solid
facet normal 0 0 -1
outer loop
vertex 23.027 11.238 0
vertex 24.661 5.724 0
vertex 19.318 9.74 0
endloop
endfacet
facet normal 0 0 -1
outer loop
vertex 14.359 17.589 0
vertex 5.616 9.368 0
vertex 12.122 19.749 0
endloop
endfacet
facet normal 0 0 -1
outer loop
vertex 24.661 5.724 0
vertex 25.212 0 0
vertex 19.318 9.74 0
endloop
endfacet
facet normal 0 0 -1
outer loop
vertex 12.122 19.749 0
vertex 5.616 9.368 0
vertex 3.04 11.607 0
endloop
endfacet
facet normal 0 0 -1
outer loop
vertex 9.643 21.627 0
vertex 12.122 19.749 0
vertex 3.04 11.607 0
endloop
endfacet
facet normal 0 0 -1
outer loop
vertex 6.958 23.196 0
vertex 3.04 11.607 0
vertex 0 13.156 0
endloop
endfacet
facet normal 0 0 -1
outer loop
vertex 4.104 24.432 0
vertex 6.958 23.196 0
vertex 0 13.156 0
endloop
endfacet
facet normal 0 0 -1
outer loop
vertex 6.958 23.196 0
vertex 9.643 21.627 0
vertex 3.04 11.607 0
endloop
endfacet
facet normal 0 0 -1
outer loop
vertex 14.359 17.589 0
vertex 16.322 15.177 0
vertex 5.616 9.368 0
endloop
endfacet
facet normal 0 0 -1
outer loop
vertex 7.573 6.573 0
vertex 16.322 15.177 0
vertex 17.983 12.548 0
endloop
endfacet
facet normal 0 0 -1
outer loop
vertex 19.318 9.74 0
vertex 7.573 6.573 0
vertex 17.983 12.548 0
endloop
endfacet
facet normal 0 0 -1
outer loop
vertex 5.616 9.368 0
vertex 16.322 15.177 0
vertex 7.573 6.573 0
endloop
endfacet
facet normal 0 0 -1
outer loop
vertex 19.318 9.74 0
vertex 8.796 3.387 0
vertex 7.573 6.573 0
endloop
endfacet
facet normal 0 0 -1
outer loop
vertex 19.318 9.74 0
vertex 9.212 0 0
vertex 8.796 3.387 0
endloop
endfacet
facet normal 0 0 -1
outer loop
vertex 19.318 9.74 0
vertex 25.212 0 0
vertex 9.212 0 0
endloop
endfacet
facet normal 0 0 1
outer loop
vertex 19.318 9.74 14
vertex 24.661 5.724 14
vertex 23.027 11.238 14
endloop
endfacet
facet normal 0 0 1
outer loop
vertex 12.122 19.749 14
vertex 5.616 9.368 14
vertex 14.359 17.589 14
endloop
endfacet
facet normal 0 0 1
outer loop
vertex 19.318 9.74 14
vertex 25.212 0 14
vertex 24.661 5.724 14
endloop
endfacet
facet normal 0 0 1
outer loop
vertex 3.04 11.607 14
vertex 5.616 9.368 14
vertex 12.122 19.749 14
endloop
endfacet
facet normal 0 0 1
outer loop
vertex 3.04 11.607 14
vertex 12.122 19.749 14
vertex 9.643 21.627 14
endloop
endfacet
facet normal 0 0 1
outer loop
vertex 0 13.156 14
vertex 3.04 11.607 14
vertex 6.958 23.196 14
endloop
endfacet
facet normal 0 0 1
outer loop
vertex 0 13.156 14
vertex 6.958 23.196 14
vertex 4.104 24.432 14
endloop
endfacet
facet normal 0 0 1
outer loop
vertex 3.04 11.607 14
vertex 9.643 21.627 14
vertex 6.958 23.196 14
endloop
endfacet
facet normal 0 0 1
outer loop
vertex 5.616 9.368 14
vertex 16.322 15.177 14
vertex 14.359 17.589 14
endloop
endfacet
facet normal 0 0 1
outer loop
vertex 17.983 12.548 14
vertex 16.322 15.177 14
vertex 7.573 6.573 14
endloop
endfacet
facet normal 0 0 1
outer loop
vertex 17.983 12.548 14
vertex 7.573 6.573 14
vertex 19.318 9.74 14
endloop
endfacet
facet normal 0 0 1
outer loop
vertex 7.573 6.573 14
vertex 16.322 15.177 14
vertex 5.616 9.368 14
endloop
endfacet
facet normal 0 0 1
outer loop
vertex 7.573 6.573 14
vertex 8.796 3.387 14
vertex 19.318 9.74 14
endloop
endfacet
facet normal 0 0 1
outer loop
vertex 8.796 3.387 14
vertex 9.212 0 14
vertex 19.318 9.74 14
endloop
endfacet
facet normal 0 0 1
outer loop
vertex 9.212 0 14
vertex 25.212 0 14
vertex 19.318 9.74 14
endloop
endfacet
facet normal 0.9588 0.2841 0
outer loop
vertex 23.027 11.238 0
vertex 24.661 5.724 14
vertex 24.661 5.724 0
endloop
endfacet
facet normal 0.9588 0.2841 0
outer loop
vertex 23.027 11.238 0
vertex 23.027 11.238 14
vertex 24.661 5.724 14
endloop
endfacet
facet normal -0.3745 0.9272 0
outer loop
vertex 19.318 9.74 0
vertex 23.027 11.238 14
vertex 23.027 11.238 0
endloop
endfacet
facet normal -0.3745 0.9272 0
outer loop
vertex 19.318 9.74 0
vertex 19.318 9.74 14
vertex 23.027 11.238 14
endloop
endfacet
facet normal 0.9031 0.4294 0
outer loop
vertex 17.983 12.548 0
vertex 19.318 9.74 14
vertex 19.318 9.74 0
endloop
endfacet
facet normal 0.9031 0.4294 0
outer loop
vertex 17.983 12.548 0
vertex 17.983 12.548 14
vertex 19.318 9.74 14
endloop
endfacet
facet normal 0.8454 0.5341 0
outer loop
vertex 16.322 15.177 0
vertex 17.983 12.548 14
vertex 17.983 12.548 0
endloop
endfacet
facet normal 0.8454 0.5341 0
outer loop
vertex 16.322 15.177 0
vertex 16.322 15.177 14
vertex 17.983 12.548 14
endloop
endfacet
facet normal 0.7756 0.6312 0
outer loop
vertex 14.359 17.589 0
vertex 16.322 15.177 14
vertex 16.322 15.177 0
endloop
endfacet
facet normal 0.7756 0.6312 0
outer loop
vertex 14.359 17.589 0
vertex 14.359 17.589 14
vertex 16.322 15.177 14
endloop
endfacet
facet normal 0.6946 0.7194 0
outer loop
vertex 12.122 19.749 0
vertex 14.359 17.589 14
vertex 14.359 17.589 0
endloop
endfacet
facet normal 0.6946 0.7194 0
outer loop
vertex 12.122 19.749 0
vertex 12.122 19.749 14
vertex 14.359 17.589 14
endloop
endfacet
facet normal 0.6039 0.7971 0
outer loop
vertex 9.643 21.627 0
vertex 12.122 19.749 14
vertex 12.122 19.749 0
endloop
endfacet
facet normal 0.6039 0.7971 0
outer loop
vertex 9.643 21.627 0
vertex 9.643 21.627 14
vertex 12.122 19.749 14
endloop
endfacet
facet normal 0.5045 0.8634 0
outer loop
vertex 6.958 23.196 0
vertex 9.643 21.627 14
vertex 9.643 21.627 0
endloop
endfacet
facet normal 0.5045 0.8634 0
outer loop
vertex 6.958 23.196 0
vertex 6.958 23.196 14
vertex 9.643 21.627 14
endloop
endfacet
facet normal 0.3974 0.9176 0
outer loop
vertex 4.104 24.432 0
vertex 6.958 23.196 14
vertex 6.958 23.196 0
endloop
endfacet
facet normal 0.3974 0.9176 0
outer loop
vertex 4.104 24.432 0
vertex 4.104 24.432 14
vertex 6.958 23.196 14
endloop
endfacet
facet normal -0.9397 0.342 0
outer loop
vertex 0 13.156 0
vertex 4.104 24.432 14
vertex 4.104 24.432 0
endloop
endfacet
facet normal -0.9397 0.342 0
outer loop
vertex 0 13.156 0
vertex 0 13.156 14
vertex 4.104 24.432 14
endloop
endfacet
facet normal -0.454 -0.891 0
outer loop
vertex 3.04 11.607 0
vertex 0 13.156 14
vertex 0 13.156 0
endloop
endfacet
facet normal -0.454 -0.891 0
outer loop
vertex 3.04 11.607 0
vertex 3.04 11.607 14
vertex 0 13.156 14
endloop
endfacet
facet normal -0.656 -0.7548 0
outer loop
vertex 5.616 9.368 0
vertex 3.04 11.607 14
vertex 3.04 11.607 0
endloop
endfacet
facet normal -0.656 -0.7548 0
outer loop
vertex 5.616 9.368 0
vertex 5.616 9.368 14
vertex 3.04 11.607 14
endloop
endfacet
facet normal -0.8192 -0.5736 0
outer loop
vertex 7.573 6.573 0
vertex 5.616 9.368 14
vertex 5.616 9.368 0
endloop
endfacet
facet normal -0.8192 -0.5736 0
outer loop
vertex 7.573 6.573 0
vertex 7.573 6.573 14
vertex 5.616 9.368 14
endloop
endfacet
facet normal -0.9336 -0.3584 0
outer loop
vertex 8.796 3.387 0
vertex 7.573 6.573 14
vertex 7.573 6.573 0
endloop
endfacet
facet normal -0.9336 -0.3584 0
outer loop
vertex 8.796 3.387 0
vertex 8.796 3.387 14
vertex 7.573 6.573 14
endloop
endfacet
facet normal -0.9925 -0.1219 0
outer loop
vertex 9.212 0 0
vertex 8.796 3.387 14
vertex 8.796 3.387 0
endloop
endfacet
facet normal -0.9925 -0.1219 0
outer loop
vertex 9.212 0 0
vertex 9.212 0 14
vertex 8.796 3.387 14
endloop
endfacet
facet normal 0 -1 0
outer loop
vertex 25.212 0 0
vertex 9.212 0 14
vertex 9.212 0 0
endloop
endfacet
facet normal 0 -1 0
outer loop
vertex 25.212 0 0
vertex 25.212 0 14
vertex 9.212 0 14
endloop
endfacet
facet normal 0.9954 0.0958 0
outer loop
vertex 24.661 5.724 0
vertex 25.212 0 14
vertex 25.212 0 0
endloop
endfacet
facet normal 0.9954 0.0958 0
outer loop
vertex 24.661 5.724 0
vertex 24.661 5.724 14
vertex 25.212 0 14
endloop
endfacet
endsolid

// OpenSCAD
$fn = 32;

// ----------------------------------------------------------------------
// Arc stop: segment, 14 mm thick
// ----------------------------------------------------------------------

// --- parameters (mm) ---
profile_height = 14;      // extrusion height
profile_points = 17;      // points of the closed outline

profile = [[25.212, 0], [24.661, 5.724], [23.027, 11.238], [19.318, 9.74], [17.983, 12.548], [16.322, 15.177], [14.359, 17.589], [12.122, 19.749], [9.643, 21.627], [6.958, 23.196], [4.104, 24.432], [0, 13.156], [3.04, 11.607], [5.616, 9.368], [7.573, 6.573], [8.796, 3.387], [9.212, 0]];  // single closed polygon, 17 points, counter clockwise

// --- the one profile operation ---
linear_extrude(height = profile_height) polygon(points = profile);
